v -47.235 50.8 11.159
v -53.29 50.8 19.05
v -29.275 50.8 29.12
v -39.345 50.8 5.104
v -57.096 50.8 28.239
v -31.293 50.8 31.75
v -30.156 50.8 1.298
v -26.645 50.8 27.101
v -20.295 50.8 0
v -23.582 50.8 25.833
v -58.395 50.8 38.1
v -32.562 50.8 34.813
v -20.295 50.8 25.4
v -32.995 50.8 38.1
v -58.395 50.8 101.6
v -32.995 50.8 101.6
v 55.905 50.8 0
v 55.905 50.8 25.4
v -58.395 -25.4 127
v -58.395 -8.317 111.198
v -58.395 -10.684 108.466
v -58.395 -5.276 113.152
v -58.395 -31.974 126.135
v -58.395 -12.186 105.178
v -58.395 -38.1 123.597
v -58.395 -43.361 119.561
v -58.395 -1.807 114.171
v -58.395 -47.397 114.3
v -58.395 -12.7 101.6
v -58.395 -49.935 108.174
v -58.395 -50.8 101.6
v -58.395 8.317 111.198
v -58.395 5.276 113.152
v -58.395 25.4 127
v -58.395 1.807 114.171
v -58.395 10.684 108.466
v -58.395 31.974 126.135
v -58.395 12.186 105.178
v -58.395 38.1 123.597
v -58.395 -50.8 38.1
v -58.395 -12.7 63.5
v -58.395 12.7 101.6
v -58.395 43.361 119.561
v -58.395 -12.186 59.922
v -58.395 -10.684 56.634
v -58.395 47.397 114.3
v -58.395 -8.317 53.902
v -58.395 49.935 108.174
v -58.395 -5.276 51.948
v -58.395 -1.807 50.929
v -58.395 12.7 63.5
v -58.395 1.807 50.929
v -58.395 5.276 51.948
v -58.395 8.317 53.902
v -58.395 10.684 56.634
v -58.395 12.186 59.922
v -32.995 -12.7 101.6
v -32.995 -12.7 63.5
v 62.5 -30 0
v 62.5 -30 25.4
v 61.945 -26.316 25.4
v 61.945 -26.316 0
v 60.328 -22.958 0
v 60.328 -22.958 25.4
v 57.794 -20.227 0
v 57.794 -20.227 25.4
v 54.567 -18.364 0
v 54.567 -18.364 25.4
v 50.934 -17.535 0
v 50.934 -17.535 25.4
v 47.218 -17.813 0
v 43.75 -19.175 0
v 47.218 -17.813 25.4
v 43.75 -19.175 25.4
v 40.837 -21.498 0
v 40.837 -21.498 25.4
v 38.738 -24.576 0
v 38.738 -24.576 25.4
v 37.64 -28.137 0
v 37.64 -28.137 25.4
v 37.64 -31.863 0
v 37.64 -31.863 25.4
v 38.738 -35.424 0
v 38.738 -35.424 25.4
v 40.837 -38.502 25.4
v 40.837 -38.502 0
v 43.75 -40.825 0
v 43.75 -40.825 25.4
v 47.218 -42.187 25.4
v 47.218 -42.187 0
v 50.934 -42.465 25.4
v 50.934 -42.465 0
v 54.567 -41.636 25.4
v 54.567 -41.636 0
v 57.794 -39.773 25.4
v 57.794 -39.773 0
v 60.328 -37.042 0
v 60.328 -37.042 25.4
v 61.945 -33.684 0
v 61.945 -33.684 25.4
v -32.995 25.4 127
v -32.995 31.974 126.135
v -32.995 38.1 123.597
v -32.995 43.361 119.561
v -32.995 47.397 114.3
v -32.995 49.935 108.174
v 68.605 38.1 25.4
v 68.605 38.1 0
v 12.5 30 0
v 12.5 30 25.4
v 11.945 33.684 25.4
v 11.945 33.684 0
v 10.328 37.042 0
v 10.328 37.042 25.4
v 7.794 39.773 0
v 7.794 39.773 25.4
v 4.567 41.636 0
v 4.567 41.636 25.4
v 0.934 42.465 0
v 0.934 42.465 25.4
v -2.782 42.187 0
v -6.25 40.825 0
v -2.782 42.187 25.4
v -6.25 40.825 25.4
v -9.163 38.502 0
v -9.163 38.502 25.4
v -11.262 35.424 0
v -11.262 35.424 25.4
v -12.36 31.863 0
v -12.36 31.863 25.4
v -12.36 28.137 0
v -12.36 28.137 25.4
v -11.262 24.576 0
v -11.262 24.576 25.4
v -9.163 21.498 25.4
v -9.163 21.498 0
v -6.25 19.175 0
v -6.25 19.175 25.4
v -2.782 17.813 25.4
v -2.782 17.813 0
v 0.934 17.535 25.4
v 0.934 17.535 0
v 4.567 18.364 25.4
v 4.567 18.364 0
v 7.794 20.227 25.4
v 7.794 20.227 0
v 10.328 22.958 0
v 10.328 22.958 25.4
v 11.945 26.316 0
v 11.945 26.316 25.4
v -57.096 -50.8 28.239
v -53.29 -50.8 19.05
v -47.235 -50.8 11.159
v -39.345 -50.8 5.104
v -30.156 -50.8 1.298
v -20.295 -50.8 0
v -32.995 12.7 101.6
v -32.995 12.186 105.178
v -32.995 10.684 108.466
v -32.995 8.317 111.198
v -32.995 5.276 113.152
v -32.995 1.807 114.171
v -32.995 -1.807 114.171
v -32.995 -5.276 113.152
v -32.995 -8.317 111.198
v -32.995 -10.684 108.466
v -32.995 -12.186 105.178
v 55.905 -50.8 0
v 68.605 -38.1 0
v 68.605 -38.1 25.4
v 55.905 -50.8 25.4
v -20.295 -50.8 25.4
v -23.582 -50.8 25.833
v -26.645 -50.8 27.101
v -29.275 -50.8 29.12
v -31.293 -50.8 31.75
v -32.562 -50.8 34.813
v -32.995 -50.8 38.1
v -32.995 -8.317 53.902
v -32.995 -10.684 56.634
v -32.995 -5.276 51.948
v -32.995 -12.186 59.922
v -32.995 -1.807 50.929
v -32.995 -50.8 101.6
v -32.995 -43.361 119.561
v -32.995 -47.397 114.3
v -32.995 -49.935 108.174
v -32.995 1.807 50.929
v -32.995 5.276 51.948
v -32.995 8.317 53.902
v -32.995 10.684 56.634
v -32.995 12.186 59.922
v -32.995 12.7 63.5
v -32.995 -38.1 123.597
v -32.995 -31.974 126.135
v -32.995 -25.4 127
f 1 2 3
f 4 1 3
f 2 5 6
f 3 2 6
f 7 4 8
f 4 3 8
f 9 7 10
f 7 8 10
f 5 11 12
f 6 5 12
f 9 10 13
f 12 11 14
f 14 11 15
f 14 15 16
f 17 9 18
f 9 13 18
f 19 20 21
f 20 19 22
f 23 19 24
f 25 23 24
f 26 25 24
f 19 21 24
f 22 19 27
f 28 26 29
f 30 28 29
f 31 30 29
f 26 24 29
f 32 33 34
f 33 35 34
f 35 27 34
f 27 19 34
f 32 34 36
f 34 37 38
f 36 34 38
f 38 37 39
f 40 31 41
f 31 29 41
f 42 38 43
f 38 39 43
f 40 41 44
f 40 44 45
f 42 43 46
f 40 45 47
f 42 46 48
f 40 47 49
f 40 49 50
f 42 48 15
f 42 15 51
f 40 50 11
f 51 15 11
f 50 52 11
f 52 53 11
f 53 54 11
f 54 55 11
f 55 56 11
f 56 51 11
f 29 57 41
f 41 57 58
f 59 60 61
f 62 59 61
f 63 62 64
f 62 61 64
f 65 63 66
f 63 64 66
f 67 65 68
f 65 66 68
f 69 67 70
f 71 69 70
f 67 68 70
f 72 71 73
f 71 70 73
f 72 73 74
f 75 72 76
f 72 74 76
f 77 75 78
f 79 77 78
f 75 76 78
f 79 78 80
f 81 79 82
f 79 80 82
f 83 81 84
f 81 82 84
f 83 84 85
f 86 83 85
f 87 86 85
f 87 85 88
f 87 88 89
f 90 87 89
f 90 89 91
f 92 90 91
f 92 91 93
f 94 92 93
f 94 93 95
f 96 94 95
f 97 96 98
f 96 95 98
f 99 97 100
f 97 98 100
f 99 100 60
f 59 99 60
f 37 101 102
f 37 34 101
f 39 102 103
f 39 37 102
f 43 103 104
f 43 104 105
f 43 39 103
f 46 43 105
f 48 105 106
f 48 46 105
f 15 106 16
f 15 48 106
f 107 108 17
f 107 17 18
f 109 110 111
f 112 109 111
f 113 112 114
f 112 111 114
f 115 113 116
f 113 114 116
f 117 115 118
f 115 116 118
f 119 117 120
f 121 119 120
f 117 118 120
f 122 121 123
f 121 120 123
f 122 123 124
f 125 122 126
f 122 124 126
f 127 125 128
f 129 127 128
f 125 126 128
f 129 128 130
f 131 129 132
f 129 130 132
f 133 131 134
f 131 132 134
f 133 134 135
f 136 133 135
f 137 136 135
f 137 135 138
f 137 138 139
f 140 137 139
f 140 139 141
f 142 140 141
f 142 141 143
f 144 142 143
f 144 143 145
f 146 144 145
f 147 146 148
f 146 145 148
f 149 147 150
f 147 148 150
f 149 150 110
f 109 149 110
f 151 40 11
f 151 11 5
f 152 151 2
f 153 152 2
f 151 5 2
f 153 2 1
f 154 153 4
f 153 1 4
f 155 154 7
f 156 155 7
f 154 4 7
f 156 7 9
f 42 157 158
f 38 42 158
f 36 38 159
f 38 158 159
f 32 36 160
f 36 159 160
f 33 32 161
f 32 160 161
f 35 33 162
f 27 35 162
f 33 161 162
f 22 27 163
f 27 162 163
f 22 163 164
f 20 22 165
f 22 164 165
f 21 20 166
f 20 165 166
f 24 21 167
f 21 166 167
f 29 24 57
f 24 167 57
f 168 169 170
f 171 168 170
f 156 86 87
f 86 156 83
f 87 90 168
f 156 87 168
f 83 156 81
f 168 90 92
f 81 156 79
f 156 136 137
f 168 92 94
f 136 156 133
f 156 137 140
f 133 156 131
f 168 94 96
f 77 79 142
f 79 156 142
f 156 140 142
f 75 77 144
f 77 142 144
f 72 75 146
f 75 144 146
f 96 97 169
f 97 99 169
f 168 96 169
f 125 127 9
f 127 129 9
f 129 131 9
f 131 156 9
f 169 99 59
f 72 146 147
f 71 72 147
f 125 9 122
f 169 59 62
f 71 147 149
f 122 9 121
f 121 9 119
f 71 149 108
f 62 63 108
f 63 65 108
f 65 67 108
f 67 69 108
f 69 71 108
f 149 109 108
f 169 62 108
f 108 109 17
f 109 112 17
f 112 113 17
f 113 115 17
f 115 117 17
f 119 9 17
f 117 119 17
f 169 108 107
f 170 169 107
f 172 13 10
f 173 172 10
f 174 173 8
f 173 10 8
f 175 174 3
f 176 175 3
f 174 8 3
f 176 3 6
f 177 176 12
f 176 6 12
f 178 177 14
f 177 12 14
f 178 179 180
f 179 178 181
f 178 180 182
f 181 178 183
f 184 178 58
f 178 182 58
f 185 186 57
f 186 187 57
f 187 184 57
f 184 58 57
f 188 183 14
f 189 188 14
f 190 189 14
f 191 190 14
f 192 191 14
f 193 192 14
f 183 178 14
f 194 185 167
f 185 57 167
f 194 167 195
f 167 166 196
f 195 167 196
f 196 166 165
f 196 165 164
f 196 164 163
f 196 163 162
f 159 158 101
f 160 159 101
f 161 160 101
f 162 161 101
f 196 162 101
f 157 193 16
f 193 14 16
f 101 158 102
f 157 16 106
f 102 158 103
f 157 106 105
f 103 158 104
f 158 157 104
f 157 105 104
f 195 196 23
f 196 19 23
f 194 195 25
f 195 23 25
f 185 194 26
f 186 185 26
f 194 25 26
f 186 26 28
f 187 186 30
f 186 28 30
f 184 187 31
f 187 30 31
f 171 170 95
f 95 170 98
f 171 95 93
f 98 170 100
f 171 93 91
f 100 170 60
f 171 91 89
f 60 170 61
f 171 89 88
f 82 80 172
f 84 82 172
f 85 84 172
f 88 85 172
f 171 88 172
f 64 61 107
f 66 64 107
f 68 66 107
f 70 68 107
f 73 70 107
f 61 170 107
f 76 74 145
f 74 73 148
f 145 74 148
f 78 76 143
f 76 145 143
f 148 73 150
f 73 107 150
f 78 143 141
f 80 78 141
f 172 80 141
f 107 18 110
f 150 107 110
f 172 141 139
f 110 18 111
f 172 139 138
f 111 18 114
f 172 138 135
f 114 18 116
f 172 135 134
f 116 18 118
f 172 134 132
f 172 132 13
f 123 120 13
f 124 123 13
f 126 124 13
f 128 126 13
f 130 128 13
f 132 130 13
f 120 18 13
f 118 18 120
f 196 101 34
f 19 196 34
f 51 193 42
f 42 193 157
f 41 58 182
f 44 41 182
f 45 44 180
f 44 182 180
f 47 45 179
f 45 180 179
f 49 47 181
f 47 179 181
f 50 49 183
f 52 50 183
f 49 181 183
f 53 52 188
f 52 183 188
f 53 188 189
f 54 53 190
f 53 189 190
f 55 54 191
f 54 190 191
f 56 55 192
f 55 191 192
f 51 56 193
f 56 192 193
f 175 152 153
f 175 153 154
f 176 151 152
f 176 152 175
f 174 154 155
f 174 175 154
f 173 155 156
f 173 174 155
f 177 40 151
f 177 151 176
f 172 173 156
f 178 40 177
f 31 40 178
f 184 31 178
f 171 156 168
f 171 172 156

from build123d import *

# Parameters (mm, degrees)
F1_DEPTH      = 50.8
F1_DEPTH_BACK = 50.8
F3_DEPTH      = 25.4
F4_R          = 12.5
F5_DEPTH      = 25.4
F6_R          = 25.4
F7_SIZE       = 12.7


with BuildPart() as f1:
    # F0 (on Front) → F1 (new body, two sides)
    with BuildSketch(Plane.XZ) as f1_sk:
        with BuildLine():
            Line((-32.9945316374, 127), (-58.3945316374, 127))
            Line((-58.3945316374, 127), (-58.3945316374, 38.1))
            ThreePointArc((-58.3945316374, 38.1), (-47.2353000006, 11.1592316368), (-20.2945316374, 0))
            Line((-20.2945316374, 0), (68.6054683626, 0))
            Line((68.6054683626, 0), (68.6054683626, 25.4))
            Line((68.6054683626, 25.4), (-20.2945316374, 25.4))
            ThreePointArc((-20.2945316374, 25.4), (-29.2747877585, 29.1197438789), (-32.9945316374, 38.1))
            Line((-32.9945316374, 38.1), (-32.9945316374, 127))
        make_face()
    extrude(amount=-F1_DEPTH)
    extrude(f1_sk.sketch, amount=F1_DEPTH_BACK)

    # F2 (on face) → F3 (cut)
    with BuildSketch(Plane.YZ.offset(-32.9945316374)):
        with BuildLine():
            ThreePointArc((12.7, 101.6), (0, 114.3), (-12.7, 101.6))
            Line((-12.7, 101.6), (-12.7, 63.5))
            ThreePointArc((-12.7, 63.5), (0, 50.8), (12.7, 63.5))
            Line((12.7, 63.5), (12.7, 101.6))
        make_face()
    extrude(amount=-F3_DEPTH, mode=Mode.SUBTRACT)

    # F4 (on face) → F5 (cut)
    with BuildSketch(Plane.XY.offset(25.4)):
        with Locations((0, 30)):
            Circle(F4_R)
        with Locations((50, -30)):
            Circle(F4_R)
    extrude(amount=-F5_DEPTH, mode=Mode.SUBTRACT)

    # F6
    f6_edges = [f1.edges().sort_by_distance(p)[0] for p in [
        (-45.694532, -50.8, 127),
        (-45.694532, 50.8, 127),
    ]]
    fillet(f6_edges, radius=F6_R)

    # F7
    f7_edges = [f1.edges().sort_by_distance(p)[0] for p in [
        (68.605468, -50.8, 12.7),
        (68.605468, 50.8, 12.7),
    ]]
    chamfer(f7_edges, length=F7_SIZE)


solid = f1.part
